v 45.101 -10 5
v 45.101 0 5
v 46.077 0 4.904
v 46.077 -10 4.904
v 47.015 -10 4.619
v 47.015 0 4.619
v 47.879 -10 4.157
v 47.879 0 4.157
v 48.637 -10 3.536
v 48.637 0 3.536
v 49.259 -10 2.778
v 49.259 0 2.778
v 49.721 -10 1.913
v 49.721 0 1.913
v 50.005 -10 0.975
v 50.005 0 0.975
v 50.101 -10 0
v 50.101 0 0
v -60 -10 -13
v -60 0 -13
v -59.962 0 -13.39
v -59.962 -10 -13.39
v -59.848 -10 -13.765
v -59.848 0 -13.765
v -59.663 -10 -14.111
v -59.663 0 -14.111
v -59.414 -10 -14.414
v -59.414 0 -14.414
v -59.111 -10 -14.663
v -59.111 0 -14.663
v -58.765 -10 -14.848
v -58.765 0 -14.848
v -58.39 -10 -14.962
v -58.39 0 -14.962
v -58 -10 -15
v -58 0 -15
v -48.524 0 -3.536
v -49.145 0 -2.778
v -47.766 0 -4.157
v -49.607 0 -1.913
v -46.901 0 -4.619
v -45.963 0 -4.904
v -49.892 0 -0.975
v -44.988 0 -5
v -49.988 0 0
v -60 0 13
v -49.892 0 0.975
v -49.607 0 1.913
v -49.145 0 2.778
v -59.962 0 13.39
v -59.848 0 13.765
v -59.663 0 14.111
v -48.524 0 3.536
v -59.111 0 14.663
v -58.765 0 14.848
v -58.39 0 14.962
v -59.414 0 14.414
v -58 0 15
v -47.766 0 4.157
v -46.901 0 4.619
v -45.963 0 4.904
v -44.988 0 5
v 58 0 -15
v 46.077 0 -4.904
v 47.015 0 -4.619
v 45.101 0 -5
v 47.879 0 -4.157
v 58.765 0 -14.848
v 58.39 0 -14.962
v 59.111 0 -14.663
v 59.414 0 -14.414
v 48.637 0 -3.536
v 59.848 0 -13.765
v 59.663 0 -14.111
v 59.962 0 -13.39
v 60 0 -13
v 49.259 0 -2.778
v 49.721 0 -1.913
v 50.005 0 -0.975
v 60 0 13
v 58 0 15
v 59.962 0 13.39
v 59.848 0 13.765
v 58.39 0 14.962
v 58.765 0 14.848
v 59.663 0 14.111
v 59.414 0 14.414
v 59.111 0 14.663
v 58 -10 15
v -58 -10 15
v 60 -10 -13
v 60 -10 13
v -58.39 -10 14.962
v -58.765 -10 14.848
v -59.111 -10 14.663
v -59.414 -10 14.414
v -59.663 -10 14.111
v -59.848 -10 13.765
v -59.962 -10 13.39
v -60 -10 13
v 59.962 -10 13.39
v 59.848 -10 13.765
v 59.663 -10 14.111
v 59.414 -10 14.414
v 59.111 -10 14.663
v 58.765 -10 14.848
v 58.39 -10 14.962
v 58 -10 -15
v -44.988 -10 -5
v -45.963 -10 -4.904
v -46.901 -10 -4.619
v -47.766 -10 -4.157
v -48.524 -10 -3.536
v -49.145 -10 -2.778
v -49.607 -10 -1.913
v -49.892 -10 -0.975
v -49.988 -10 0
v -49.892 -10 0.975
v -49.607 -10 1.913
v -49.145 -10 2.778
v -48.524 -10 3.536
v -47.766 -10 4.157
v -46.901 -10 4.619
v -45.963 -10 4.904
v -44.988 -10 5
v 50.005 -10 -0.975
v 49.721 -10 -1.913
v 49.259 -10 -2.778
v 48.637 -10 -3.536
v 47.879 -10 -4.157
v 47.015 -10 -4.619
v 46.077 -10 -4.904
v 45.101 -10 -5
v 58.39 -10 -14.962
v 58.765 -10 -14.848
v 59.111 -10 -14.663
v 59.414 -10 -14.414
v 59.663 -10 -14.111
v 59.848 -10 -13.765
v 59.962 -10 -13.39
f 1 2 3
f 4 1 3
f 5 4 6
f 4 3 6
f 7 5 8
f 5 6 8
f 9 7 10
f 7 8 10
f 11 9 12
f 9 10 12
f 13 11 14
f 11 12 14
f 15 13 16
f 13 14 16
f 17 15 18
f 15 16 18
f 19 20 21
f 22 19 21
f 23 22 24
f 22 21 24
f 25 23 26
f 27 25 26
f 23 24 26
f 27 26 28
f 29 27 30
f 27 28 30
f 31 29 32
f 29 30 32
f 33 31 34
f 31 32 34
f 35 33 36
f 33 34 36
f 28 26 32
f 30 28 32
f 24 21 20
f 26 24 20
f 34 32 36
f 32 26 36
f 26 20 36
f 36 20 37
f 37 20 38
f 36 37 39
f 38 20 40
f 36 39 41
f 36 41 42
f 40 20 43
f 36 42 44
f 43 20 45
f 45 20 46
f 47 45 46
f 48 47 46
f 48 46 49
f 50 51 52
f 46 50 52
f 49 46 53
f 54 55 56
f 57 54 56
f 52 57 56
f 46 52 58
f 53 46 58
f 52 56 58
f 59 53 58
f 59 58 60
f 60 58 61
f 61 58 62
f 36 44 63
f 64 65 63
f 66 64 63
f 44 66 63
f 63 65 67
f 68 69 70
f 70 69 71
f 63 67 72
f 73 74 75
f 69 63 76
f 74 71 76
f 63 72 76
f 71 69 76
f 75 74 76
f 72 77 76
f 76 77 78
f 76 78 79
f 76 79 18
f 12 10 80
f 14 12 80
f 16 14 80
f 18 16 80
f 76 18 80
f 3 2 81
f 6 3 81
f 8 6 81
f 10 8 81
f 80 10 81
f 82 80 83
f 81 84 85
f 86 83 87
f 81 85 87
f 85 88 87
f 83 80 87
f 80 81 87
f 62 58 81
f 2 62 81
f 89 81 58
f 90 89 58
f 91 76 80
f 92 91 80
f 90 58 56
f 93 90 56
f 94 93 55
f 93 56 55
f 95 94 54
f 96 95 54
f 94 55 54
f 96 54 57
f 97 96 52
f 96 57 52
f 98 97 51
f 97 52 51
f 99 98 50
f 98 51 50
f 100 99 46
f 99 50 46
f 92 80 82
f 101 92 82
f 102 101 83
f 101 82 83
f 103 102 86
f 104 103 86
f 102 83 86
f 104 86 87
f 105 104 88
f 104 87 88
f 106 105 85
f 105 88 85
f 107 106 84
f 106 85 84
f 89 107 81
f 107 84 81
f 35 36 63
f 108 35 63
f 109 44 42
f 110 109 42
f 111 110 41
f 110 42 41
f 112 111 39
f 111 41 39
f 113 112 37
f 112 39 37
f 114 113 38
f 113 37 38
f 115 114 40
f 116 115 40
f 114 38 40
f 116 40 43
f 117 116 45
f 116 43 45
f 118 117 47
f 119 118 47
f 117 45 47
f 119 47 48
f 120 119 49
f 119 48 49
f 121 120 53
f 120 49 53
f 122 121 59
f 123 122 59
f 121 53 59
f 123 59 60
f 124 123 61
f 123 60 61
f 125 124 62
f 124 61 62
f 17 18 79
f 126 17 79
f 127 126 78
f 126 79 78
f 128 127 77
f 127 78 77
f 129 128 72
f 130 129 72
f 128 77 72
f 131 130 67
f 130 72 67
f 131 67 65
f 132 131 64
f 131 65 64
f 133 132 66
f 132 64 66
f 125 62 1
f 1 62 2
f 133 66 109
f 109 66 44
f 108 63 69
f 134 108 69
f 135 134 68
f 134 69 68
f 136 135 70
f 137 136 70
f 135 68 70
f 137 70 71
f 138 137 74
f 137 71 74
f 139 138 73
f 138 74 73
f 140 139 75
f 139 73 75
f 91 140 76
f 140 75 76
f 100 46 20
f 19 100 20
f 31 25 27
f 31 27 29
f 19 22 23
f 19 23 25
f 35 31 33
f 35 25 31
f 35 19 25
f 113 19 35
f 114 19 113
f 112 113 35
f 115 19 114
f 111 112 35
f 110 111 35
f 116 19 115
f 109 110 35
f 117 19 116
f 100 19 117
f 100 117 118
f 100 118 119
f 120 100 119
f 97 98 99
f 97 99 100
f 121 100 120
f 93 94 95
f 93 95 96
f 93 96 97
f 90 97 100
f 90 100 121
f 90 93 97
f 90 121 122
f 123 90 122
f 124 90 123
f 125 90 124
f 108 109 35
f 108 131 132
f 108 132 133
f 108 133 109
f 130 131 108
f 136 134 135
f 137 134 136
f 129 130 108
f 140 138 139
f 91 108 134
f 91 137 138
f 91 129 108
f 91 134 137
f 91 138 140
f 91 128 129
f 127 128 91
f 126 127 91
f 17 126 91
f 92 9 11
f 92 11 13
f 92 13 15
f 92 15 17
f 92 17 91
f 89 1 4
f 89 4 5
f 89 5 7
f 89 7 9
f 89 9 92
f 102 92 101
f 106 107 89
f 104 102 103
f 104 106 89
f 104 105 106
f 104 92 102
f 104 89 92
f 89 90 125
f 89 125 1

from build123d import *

# Parameters (mm, degrees)
F1_DEPTH = 10


with BuildPart() as f1:
    # F0 (on Front) → F1 (new body)
    with BuildSketch(Plane.XZ):
        with BuildLine():
            ThreePointArc((60, 13), (59.414214, 14.414214), (58, 15))
            Line((58, 15), (-58, 15))
            ThreePointArc((-58, 15), (-59.414214, 14.414214), (-60, 13))
            Line((-60, 13), (-60, -13))
            ThreePointArc((-60, -13), (-59.414214, -14.414214), (-58, -15))
            Line((-58, -15), (58, -15))
            ThreePointArc((58, -15), (59.414214, -14.414214), (60, -13))
            Line((60, -13), (60, 13))
        make_face()
        with BuildLine():
            Line((-44.987983, 5), (45.101259, 5))
            ThreePointArc((45.101259, 5), (48.636793, 3.535534), (50.101259, 0))
            ThreePointArc((50.101259, 0), (48.636793, -3.535534), (45.101259, -5))
            Line((45.101259, -5), (-44.987983, -5))
            ThreePointArc((-44.987983, -5), (-49.987983, 0), (-44.987983, 5))
        make_face(mode=Mode.SUBTRACT)
    extrude(amount=F1_DEPTH)


solid = f1.part
